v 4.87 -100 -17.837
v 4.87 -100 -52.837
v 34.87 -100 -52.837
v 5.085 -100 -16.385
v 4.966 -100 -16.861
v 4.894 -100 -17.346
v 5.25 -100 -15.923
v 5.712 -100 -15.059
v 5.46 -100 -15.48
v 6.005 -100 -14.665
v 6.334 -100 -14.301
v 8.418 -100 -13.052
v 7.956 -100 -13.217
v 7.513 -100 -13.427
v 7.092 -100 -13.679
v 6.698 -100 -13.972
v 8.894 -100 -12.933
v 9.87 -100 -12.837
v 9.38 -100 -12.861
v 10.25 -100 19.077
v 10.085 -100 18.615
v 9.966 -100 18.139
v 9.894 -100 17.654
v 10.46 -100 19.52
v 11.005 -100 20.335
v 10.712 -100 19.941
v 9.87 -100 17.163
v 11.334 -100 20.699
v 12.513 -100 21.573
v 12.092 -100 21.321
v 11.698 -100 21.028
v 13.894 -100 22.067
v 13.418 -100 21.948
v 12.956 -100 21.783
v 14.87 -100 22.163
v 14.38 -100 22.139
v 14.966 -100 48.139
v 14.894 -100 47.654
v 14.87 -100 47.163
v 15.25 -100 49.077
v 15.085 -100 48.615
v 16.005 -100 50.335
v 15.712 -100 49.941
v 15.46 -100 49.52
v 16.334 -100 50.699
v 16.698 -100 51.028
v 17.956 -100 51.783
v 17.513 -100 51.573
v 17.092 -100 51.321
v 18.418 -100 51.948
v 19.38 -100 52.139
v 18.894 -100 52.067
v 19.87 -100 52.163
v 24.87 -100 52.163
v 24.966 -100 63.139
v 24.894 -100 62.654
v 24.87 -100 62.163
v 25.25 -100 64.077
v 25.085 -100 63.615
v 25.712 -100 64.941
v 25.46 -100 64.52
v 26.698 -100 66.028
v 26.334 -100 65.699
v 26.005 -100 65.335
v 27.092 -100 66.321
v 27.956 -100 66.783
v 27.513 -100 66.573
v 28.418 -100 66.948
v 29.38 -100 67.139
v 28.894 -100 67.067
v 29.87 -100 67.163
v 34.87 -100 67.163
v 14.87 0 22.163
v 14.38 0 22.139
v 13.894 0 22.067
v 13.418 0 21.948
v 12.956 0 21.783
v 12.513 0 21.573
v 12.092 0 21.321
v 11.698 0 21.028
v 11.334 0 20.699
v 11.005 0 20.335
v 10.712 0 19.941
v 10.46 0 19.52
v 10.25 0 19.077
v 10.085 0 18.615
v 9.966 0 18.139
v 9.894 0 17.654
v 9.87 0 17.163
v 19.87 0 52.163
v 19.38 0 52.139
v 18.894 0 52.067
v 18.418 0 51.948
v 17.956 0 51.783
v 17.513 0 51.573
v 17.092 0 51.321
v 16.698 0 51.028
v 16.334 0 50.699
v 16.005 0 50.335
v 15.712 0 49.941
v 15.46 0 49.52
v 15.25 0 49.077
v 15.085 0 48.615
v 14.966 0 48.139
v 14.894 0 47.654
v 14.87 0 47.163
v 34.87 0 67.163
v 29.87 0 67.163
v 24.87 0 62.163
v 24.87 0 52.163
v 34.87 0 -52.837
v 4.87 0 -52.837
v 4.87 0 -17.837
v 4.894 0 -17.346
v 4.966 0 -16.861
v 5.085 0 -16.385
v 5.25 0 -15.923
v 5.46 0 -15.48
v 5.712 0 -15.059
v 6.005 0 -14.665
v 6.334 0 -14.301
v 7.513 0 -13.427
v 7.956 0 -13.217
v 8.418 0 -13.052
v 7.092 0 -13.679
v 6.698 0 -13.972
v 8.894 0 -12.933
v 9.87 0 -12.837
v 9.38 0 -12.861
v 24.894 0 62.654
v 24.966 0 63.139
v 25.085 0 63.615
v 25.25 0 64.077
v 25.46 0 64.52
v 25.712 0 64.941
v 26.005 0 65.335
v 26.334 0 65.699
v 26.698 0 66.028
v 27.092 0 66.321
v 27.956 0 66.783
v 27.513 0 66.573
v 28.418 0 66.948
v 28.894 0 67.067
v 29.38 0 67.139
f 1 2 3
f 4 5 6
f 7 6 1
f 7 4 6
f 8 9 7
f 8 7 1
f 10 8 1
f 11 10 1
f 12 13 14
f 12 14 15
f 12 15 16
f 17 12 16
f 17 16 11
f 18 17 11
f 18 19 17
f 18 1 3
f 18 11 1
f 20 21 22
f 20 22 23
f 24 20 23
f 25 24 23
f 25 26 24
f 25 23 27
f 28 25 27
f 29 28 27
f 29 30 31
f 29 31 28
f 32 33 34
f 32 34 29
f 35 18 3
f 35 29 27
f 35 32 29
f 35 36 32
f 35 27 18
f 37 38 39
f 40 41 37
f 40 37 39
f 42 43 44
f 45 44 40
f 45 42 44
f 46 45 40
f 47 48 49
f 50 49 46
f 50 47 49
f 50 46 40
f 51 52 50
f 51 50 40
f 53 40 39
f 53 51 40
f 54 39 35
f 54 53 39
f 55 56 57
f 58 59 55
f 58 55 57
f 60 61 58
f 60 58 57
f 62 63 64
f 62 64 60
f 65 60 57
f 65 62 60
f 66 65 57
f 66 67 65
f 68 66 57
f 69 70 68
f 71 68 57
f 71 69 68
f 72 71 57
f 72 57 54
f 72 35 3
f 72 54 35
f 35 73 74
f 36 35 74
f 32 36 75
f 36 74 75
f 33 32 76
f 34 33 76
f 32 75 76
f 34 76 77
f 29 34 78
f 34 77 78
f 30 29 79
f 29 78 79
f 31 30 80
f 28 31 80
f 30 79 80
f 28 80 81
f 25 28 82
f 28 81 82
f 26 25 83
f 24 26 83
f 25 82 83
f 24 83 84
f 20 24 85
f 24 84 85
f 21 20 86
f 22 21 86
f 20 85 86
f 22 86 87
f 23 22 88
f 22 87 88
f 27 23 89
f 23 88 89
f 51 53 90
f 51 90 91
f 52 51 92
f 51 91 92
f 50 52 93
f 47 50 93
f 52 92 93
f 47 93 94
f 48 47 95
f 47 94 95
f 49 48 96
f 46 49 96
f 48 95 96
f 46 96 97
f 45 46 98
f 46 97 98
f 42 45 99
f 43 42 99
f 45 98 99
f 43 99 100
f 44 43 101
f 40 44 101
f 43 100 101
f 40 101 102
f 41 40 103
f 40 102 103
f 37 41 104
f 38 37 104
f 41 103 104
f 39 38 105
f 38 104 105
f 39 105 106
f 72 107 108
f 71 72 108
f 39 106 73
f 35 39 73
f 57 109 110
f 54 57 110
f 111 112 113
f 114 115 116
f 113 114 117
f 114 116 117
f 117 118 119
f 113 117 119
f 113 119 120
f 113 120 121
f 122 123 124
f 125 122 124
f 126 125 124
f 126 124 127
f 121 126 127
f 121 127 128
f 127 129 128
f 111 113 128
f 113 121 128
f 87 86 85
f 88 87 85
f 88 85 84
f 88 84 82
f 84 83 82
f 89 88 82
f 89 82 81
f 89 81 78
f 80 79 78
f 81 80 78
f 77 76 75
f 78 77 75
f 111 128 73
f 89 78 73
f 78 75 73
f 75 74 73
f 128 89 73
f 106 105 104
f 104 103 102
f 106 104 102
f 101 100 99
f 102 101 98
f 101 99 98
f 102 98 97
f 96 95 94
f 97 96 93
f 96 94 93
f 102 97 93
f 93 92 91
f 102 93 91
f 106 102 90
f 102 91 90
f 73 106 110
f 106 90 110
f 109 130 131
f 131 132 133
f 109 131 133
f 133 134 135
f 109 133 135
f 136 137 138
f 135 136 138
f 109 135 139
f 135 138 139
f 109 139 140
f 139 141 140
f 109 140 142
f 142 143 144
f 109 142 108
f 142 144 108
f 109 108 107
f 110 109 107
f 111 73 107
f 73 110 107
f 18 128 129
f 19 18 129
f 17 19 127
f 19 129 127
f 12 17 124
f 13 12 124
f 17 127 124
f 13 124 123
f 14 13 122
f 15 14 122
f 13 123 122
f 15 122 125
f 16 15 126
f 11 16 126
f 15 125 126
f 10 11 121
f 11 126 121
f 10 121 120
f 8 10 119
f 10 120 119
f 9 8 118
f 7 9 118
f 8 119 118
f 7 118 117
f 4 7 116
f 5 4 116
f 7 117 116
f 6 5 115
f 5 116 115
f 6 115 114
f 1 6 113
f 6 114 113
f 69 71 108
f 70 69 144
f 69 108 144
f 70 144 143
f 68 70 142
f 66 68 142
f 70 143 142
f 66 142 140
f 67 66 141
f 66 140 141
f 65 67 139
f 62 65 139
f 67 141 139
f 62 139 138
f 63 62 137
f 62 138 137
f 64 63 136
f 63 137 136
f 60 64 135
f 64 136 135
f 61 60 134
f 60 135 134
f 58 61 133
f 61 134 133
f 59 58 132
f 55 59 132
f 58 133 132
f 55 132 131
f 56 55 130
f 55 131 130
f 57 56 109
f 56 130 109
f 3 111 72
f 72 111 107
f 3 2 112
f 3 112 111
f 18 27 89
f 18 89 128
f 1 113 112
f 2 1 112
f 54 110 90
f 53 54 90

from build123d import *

# Parameters (mm, degrees)
F1_DEPTH = 100


with BuildPart() as f1:
    # F0 (on Front) → F1 (new body)
    with BuildSketch(Plane.XZ):
        with BuildLine():
            Line((34.869739, -52.836575), (34.869739, 67.163425))
            Line((34.869739, 67.163425), (29.869739, 67.163425))
            ThreePointArc((29.869739, 67.163425), (26.334205, 65.698959), (24.869739, 62.163425))
            Line((24.869739, 62.163425), (24.869739, 52.163425))
            Line((24.869739, 52.163425), (19.869739, 52.163425))
            ThreePointArc((19.869739, 52.163425), (16.334205, 50.698959), (14.869739, 47.163425))
            Line((14.869739, 47.163425), (14.869739, 22.163425))
            ThreePointArc((14.869739, 22.163425), (11.334205, 20.698959), (9.869739, 17.163425))
            Line((9.869739, 17.163425), (9.869739, -12.836575))
            ThreePointArc((9.869739, -12.836575), (6.334205, -14.301041), (4.869739, -17.836575))
            Line((4.869739, -17.836575), (4.869739, -52.836575))
            Line((4.869739, -52.836575), (34.869739, -52.836575))
        make_face()
    extrude(amount=F1_DEPTH)


solid = f1.part
